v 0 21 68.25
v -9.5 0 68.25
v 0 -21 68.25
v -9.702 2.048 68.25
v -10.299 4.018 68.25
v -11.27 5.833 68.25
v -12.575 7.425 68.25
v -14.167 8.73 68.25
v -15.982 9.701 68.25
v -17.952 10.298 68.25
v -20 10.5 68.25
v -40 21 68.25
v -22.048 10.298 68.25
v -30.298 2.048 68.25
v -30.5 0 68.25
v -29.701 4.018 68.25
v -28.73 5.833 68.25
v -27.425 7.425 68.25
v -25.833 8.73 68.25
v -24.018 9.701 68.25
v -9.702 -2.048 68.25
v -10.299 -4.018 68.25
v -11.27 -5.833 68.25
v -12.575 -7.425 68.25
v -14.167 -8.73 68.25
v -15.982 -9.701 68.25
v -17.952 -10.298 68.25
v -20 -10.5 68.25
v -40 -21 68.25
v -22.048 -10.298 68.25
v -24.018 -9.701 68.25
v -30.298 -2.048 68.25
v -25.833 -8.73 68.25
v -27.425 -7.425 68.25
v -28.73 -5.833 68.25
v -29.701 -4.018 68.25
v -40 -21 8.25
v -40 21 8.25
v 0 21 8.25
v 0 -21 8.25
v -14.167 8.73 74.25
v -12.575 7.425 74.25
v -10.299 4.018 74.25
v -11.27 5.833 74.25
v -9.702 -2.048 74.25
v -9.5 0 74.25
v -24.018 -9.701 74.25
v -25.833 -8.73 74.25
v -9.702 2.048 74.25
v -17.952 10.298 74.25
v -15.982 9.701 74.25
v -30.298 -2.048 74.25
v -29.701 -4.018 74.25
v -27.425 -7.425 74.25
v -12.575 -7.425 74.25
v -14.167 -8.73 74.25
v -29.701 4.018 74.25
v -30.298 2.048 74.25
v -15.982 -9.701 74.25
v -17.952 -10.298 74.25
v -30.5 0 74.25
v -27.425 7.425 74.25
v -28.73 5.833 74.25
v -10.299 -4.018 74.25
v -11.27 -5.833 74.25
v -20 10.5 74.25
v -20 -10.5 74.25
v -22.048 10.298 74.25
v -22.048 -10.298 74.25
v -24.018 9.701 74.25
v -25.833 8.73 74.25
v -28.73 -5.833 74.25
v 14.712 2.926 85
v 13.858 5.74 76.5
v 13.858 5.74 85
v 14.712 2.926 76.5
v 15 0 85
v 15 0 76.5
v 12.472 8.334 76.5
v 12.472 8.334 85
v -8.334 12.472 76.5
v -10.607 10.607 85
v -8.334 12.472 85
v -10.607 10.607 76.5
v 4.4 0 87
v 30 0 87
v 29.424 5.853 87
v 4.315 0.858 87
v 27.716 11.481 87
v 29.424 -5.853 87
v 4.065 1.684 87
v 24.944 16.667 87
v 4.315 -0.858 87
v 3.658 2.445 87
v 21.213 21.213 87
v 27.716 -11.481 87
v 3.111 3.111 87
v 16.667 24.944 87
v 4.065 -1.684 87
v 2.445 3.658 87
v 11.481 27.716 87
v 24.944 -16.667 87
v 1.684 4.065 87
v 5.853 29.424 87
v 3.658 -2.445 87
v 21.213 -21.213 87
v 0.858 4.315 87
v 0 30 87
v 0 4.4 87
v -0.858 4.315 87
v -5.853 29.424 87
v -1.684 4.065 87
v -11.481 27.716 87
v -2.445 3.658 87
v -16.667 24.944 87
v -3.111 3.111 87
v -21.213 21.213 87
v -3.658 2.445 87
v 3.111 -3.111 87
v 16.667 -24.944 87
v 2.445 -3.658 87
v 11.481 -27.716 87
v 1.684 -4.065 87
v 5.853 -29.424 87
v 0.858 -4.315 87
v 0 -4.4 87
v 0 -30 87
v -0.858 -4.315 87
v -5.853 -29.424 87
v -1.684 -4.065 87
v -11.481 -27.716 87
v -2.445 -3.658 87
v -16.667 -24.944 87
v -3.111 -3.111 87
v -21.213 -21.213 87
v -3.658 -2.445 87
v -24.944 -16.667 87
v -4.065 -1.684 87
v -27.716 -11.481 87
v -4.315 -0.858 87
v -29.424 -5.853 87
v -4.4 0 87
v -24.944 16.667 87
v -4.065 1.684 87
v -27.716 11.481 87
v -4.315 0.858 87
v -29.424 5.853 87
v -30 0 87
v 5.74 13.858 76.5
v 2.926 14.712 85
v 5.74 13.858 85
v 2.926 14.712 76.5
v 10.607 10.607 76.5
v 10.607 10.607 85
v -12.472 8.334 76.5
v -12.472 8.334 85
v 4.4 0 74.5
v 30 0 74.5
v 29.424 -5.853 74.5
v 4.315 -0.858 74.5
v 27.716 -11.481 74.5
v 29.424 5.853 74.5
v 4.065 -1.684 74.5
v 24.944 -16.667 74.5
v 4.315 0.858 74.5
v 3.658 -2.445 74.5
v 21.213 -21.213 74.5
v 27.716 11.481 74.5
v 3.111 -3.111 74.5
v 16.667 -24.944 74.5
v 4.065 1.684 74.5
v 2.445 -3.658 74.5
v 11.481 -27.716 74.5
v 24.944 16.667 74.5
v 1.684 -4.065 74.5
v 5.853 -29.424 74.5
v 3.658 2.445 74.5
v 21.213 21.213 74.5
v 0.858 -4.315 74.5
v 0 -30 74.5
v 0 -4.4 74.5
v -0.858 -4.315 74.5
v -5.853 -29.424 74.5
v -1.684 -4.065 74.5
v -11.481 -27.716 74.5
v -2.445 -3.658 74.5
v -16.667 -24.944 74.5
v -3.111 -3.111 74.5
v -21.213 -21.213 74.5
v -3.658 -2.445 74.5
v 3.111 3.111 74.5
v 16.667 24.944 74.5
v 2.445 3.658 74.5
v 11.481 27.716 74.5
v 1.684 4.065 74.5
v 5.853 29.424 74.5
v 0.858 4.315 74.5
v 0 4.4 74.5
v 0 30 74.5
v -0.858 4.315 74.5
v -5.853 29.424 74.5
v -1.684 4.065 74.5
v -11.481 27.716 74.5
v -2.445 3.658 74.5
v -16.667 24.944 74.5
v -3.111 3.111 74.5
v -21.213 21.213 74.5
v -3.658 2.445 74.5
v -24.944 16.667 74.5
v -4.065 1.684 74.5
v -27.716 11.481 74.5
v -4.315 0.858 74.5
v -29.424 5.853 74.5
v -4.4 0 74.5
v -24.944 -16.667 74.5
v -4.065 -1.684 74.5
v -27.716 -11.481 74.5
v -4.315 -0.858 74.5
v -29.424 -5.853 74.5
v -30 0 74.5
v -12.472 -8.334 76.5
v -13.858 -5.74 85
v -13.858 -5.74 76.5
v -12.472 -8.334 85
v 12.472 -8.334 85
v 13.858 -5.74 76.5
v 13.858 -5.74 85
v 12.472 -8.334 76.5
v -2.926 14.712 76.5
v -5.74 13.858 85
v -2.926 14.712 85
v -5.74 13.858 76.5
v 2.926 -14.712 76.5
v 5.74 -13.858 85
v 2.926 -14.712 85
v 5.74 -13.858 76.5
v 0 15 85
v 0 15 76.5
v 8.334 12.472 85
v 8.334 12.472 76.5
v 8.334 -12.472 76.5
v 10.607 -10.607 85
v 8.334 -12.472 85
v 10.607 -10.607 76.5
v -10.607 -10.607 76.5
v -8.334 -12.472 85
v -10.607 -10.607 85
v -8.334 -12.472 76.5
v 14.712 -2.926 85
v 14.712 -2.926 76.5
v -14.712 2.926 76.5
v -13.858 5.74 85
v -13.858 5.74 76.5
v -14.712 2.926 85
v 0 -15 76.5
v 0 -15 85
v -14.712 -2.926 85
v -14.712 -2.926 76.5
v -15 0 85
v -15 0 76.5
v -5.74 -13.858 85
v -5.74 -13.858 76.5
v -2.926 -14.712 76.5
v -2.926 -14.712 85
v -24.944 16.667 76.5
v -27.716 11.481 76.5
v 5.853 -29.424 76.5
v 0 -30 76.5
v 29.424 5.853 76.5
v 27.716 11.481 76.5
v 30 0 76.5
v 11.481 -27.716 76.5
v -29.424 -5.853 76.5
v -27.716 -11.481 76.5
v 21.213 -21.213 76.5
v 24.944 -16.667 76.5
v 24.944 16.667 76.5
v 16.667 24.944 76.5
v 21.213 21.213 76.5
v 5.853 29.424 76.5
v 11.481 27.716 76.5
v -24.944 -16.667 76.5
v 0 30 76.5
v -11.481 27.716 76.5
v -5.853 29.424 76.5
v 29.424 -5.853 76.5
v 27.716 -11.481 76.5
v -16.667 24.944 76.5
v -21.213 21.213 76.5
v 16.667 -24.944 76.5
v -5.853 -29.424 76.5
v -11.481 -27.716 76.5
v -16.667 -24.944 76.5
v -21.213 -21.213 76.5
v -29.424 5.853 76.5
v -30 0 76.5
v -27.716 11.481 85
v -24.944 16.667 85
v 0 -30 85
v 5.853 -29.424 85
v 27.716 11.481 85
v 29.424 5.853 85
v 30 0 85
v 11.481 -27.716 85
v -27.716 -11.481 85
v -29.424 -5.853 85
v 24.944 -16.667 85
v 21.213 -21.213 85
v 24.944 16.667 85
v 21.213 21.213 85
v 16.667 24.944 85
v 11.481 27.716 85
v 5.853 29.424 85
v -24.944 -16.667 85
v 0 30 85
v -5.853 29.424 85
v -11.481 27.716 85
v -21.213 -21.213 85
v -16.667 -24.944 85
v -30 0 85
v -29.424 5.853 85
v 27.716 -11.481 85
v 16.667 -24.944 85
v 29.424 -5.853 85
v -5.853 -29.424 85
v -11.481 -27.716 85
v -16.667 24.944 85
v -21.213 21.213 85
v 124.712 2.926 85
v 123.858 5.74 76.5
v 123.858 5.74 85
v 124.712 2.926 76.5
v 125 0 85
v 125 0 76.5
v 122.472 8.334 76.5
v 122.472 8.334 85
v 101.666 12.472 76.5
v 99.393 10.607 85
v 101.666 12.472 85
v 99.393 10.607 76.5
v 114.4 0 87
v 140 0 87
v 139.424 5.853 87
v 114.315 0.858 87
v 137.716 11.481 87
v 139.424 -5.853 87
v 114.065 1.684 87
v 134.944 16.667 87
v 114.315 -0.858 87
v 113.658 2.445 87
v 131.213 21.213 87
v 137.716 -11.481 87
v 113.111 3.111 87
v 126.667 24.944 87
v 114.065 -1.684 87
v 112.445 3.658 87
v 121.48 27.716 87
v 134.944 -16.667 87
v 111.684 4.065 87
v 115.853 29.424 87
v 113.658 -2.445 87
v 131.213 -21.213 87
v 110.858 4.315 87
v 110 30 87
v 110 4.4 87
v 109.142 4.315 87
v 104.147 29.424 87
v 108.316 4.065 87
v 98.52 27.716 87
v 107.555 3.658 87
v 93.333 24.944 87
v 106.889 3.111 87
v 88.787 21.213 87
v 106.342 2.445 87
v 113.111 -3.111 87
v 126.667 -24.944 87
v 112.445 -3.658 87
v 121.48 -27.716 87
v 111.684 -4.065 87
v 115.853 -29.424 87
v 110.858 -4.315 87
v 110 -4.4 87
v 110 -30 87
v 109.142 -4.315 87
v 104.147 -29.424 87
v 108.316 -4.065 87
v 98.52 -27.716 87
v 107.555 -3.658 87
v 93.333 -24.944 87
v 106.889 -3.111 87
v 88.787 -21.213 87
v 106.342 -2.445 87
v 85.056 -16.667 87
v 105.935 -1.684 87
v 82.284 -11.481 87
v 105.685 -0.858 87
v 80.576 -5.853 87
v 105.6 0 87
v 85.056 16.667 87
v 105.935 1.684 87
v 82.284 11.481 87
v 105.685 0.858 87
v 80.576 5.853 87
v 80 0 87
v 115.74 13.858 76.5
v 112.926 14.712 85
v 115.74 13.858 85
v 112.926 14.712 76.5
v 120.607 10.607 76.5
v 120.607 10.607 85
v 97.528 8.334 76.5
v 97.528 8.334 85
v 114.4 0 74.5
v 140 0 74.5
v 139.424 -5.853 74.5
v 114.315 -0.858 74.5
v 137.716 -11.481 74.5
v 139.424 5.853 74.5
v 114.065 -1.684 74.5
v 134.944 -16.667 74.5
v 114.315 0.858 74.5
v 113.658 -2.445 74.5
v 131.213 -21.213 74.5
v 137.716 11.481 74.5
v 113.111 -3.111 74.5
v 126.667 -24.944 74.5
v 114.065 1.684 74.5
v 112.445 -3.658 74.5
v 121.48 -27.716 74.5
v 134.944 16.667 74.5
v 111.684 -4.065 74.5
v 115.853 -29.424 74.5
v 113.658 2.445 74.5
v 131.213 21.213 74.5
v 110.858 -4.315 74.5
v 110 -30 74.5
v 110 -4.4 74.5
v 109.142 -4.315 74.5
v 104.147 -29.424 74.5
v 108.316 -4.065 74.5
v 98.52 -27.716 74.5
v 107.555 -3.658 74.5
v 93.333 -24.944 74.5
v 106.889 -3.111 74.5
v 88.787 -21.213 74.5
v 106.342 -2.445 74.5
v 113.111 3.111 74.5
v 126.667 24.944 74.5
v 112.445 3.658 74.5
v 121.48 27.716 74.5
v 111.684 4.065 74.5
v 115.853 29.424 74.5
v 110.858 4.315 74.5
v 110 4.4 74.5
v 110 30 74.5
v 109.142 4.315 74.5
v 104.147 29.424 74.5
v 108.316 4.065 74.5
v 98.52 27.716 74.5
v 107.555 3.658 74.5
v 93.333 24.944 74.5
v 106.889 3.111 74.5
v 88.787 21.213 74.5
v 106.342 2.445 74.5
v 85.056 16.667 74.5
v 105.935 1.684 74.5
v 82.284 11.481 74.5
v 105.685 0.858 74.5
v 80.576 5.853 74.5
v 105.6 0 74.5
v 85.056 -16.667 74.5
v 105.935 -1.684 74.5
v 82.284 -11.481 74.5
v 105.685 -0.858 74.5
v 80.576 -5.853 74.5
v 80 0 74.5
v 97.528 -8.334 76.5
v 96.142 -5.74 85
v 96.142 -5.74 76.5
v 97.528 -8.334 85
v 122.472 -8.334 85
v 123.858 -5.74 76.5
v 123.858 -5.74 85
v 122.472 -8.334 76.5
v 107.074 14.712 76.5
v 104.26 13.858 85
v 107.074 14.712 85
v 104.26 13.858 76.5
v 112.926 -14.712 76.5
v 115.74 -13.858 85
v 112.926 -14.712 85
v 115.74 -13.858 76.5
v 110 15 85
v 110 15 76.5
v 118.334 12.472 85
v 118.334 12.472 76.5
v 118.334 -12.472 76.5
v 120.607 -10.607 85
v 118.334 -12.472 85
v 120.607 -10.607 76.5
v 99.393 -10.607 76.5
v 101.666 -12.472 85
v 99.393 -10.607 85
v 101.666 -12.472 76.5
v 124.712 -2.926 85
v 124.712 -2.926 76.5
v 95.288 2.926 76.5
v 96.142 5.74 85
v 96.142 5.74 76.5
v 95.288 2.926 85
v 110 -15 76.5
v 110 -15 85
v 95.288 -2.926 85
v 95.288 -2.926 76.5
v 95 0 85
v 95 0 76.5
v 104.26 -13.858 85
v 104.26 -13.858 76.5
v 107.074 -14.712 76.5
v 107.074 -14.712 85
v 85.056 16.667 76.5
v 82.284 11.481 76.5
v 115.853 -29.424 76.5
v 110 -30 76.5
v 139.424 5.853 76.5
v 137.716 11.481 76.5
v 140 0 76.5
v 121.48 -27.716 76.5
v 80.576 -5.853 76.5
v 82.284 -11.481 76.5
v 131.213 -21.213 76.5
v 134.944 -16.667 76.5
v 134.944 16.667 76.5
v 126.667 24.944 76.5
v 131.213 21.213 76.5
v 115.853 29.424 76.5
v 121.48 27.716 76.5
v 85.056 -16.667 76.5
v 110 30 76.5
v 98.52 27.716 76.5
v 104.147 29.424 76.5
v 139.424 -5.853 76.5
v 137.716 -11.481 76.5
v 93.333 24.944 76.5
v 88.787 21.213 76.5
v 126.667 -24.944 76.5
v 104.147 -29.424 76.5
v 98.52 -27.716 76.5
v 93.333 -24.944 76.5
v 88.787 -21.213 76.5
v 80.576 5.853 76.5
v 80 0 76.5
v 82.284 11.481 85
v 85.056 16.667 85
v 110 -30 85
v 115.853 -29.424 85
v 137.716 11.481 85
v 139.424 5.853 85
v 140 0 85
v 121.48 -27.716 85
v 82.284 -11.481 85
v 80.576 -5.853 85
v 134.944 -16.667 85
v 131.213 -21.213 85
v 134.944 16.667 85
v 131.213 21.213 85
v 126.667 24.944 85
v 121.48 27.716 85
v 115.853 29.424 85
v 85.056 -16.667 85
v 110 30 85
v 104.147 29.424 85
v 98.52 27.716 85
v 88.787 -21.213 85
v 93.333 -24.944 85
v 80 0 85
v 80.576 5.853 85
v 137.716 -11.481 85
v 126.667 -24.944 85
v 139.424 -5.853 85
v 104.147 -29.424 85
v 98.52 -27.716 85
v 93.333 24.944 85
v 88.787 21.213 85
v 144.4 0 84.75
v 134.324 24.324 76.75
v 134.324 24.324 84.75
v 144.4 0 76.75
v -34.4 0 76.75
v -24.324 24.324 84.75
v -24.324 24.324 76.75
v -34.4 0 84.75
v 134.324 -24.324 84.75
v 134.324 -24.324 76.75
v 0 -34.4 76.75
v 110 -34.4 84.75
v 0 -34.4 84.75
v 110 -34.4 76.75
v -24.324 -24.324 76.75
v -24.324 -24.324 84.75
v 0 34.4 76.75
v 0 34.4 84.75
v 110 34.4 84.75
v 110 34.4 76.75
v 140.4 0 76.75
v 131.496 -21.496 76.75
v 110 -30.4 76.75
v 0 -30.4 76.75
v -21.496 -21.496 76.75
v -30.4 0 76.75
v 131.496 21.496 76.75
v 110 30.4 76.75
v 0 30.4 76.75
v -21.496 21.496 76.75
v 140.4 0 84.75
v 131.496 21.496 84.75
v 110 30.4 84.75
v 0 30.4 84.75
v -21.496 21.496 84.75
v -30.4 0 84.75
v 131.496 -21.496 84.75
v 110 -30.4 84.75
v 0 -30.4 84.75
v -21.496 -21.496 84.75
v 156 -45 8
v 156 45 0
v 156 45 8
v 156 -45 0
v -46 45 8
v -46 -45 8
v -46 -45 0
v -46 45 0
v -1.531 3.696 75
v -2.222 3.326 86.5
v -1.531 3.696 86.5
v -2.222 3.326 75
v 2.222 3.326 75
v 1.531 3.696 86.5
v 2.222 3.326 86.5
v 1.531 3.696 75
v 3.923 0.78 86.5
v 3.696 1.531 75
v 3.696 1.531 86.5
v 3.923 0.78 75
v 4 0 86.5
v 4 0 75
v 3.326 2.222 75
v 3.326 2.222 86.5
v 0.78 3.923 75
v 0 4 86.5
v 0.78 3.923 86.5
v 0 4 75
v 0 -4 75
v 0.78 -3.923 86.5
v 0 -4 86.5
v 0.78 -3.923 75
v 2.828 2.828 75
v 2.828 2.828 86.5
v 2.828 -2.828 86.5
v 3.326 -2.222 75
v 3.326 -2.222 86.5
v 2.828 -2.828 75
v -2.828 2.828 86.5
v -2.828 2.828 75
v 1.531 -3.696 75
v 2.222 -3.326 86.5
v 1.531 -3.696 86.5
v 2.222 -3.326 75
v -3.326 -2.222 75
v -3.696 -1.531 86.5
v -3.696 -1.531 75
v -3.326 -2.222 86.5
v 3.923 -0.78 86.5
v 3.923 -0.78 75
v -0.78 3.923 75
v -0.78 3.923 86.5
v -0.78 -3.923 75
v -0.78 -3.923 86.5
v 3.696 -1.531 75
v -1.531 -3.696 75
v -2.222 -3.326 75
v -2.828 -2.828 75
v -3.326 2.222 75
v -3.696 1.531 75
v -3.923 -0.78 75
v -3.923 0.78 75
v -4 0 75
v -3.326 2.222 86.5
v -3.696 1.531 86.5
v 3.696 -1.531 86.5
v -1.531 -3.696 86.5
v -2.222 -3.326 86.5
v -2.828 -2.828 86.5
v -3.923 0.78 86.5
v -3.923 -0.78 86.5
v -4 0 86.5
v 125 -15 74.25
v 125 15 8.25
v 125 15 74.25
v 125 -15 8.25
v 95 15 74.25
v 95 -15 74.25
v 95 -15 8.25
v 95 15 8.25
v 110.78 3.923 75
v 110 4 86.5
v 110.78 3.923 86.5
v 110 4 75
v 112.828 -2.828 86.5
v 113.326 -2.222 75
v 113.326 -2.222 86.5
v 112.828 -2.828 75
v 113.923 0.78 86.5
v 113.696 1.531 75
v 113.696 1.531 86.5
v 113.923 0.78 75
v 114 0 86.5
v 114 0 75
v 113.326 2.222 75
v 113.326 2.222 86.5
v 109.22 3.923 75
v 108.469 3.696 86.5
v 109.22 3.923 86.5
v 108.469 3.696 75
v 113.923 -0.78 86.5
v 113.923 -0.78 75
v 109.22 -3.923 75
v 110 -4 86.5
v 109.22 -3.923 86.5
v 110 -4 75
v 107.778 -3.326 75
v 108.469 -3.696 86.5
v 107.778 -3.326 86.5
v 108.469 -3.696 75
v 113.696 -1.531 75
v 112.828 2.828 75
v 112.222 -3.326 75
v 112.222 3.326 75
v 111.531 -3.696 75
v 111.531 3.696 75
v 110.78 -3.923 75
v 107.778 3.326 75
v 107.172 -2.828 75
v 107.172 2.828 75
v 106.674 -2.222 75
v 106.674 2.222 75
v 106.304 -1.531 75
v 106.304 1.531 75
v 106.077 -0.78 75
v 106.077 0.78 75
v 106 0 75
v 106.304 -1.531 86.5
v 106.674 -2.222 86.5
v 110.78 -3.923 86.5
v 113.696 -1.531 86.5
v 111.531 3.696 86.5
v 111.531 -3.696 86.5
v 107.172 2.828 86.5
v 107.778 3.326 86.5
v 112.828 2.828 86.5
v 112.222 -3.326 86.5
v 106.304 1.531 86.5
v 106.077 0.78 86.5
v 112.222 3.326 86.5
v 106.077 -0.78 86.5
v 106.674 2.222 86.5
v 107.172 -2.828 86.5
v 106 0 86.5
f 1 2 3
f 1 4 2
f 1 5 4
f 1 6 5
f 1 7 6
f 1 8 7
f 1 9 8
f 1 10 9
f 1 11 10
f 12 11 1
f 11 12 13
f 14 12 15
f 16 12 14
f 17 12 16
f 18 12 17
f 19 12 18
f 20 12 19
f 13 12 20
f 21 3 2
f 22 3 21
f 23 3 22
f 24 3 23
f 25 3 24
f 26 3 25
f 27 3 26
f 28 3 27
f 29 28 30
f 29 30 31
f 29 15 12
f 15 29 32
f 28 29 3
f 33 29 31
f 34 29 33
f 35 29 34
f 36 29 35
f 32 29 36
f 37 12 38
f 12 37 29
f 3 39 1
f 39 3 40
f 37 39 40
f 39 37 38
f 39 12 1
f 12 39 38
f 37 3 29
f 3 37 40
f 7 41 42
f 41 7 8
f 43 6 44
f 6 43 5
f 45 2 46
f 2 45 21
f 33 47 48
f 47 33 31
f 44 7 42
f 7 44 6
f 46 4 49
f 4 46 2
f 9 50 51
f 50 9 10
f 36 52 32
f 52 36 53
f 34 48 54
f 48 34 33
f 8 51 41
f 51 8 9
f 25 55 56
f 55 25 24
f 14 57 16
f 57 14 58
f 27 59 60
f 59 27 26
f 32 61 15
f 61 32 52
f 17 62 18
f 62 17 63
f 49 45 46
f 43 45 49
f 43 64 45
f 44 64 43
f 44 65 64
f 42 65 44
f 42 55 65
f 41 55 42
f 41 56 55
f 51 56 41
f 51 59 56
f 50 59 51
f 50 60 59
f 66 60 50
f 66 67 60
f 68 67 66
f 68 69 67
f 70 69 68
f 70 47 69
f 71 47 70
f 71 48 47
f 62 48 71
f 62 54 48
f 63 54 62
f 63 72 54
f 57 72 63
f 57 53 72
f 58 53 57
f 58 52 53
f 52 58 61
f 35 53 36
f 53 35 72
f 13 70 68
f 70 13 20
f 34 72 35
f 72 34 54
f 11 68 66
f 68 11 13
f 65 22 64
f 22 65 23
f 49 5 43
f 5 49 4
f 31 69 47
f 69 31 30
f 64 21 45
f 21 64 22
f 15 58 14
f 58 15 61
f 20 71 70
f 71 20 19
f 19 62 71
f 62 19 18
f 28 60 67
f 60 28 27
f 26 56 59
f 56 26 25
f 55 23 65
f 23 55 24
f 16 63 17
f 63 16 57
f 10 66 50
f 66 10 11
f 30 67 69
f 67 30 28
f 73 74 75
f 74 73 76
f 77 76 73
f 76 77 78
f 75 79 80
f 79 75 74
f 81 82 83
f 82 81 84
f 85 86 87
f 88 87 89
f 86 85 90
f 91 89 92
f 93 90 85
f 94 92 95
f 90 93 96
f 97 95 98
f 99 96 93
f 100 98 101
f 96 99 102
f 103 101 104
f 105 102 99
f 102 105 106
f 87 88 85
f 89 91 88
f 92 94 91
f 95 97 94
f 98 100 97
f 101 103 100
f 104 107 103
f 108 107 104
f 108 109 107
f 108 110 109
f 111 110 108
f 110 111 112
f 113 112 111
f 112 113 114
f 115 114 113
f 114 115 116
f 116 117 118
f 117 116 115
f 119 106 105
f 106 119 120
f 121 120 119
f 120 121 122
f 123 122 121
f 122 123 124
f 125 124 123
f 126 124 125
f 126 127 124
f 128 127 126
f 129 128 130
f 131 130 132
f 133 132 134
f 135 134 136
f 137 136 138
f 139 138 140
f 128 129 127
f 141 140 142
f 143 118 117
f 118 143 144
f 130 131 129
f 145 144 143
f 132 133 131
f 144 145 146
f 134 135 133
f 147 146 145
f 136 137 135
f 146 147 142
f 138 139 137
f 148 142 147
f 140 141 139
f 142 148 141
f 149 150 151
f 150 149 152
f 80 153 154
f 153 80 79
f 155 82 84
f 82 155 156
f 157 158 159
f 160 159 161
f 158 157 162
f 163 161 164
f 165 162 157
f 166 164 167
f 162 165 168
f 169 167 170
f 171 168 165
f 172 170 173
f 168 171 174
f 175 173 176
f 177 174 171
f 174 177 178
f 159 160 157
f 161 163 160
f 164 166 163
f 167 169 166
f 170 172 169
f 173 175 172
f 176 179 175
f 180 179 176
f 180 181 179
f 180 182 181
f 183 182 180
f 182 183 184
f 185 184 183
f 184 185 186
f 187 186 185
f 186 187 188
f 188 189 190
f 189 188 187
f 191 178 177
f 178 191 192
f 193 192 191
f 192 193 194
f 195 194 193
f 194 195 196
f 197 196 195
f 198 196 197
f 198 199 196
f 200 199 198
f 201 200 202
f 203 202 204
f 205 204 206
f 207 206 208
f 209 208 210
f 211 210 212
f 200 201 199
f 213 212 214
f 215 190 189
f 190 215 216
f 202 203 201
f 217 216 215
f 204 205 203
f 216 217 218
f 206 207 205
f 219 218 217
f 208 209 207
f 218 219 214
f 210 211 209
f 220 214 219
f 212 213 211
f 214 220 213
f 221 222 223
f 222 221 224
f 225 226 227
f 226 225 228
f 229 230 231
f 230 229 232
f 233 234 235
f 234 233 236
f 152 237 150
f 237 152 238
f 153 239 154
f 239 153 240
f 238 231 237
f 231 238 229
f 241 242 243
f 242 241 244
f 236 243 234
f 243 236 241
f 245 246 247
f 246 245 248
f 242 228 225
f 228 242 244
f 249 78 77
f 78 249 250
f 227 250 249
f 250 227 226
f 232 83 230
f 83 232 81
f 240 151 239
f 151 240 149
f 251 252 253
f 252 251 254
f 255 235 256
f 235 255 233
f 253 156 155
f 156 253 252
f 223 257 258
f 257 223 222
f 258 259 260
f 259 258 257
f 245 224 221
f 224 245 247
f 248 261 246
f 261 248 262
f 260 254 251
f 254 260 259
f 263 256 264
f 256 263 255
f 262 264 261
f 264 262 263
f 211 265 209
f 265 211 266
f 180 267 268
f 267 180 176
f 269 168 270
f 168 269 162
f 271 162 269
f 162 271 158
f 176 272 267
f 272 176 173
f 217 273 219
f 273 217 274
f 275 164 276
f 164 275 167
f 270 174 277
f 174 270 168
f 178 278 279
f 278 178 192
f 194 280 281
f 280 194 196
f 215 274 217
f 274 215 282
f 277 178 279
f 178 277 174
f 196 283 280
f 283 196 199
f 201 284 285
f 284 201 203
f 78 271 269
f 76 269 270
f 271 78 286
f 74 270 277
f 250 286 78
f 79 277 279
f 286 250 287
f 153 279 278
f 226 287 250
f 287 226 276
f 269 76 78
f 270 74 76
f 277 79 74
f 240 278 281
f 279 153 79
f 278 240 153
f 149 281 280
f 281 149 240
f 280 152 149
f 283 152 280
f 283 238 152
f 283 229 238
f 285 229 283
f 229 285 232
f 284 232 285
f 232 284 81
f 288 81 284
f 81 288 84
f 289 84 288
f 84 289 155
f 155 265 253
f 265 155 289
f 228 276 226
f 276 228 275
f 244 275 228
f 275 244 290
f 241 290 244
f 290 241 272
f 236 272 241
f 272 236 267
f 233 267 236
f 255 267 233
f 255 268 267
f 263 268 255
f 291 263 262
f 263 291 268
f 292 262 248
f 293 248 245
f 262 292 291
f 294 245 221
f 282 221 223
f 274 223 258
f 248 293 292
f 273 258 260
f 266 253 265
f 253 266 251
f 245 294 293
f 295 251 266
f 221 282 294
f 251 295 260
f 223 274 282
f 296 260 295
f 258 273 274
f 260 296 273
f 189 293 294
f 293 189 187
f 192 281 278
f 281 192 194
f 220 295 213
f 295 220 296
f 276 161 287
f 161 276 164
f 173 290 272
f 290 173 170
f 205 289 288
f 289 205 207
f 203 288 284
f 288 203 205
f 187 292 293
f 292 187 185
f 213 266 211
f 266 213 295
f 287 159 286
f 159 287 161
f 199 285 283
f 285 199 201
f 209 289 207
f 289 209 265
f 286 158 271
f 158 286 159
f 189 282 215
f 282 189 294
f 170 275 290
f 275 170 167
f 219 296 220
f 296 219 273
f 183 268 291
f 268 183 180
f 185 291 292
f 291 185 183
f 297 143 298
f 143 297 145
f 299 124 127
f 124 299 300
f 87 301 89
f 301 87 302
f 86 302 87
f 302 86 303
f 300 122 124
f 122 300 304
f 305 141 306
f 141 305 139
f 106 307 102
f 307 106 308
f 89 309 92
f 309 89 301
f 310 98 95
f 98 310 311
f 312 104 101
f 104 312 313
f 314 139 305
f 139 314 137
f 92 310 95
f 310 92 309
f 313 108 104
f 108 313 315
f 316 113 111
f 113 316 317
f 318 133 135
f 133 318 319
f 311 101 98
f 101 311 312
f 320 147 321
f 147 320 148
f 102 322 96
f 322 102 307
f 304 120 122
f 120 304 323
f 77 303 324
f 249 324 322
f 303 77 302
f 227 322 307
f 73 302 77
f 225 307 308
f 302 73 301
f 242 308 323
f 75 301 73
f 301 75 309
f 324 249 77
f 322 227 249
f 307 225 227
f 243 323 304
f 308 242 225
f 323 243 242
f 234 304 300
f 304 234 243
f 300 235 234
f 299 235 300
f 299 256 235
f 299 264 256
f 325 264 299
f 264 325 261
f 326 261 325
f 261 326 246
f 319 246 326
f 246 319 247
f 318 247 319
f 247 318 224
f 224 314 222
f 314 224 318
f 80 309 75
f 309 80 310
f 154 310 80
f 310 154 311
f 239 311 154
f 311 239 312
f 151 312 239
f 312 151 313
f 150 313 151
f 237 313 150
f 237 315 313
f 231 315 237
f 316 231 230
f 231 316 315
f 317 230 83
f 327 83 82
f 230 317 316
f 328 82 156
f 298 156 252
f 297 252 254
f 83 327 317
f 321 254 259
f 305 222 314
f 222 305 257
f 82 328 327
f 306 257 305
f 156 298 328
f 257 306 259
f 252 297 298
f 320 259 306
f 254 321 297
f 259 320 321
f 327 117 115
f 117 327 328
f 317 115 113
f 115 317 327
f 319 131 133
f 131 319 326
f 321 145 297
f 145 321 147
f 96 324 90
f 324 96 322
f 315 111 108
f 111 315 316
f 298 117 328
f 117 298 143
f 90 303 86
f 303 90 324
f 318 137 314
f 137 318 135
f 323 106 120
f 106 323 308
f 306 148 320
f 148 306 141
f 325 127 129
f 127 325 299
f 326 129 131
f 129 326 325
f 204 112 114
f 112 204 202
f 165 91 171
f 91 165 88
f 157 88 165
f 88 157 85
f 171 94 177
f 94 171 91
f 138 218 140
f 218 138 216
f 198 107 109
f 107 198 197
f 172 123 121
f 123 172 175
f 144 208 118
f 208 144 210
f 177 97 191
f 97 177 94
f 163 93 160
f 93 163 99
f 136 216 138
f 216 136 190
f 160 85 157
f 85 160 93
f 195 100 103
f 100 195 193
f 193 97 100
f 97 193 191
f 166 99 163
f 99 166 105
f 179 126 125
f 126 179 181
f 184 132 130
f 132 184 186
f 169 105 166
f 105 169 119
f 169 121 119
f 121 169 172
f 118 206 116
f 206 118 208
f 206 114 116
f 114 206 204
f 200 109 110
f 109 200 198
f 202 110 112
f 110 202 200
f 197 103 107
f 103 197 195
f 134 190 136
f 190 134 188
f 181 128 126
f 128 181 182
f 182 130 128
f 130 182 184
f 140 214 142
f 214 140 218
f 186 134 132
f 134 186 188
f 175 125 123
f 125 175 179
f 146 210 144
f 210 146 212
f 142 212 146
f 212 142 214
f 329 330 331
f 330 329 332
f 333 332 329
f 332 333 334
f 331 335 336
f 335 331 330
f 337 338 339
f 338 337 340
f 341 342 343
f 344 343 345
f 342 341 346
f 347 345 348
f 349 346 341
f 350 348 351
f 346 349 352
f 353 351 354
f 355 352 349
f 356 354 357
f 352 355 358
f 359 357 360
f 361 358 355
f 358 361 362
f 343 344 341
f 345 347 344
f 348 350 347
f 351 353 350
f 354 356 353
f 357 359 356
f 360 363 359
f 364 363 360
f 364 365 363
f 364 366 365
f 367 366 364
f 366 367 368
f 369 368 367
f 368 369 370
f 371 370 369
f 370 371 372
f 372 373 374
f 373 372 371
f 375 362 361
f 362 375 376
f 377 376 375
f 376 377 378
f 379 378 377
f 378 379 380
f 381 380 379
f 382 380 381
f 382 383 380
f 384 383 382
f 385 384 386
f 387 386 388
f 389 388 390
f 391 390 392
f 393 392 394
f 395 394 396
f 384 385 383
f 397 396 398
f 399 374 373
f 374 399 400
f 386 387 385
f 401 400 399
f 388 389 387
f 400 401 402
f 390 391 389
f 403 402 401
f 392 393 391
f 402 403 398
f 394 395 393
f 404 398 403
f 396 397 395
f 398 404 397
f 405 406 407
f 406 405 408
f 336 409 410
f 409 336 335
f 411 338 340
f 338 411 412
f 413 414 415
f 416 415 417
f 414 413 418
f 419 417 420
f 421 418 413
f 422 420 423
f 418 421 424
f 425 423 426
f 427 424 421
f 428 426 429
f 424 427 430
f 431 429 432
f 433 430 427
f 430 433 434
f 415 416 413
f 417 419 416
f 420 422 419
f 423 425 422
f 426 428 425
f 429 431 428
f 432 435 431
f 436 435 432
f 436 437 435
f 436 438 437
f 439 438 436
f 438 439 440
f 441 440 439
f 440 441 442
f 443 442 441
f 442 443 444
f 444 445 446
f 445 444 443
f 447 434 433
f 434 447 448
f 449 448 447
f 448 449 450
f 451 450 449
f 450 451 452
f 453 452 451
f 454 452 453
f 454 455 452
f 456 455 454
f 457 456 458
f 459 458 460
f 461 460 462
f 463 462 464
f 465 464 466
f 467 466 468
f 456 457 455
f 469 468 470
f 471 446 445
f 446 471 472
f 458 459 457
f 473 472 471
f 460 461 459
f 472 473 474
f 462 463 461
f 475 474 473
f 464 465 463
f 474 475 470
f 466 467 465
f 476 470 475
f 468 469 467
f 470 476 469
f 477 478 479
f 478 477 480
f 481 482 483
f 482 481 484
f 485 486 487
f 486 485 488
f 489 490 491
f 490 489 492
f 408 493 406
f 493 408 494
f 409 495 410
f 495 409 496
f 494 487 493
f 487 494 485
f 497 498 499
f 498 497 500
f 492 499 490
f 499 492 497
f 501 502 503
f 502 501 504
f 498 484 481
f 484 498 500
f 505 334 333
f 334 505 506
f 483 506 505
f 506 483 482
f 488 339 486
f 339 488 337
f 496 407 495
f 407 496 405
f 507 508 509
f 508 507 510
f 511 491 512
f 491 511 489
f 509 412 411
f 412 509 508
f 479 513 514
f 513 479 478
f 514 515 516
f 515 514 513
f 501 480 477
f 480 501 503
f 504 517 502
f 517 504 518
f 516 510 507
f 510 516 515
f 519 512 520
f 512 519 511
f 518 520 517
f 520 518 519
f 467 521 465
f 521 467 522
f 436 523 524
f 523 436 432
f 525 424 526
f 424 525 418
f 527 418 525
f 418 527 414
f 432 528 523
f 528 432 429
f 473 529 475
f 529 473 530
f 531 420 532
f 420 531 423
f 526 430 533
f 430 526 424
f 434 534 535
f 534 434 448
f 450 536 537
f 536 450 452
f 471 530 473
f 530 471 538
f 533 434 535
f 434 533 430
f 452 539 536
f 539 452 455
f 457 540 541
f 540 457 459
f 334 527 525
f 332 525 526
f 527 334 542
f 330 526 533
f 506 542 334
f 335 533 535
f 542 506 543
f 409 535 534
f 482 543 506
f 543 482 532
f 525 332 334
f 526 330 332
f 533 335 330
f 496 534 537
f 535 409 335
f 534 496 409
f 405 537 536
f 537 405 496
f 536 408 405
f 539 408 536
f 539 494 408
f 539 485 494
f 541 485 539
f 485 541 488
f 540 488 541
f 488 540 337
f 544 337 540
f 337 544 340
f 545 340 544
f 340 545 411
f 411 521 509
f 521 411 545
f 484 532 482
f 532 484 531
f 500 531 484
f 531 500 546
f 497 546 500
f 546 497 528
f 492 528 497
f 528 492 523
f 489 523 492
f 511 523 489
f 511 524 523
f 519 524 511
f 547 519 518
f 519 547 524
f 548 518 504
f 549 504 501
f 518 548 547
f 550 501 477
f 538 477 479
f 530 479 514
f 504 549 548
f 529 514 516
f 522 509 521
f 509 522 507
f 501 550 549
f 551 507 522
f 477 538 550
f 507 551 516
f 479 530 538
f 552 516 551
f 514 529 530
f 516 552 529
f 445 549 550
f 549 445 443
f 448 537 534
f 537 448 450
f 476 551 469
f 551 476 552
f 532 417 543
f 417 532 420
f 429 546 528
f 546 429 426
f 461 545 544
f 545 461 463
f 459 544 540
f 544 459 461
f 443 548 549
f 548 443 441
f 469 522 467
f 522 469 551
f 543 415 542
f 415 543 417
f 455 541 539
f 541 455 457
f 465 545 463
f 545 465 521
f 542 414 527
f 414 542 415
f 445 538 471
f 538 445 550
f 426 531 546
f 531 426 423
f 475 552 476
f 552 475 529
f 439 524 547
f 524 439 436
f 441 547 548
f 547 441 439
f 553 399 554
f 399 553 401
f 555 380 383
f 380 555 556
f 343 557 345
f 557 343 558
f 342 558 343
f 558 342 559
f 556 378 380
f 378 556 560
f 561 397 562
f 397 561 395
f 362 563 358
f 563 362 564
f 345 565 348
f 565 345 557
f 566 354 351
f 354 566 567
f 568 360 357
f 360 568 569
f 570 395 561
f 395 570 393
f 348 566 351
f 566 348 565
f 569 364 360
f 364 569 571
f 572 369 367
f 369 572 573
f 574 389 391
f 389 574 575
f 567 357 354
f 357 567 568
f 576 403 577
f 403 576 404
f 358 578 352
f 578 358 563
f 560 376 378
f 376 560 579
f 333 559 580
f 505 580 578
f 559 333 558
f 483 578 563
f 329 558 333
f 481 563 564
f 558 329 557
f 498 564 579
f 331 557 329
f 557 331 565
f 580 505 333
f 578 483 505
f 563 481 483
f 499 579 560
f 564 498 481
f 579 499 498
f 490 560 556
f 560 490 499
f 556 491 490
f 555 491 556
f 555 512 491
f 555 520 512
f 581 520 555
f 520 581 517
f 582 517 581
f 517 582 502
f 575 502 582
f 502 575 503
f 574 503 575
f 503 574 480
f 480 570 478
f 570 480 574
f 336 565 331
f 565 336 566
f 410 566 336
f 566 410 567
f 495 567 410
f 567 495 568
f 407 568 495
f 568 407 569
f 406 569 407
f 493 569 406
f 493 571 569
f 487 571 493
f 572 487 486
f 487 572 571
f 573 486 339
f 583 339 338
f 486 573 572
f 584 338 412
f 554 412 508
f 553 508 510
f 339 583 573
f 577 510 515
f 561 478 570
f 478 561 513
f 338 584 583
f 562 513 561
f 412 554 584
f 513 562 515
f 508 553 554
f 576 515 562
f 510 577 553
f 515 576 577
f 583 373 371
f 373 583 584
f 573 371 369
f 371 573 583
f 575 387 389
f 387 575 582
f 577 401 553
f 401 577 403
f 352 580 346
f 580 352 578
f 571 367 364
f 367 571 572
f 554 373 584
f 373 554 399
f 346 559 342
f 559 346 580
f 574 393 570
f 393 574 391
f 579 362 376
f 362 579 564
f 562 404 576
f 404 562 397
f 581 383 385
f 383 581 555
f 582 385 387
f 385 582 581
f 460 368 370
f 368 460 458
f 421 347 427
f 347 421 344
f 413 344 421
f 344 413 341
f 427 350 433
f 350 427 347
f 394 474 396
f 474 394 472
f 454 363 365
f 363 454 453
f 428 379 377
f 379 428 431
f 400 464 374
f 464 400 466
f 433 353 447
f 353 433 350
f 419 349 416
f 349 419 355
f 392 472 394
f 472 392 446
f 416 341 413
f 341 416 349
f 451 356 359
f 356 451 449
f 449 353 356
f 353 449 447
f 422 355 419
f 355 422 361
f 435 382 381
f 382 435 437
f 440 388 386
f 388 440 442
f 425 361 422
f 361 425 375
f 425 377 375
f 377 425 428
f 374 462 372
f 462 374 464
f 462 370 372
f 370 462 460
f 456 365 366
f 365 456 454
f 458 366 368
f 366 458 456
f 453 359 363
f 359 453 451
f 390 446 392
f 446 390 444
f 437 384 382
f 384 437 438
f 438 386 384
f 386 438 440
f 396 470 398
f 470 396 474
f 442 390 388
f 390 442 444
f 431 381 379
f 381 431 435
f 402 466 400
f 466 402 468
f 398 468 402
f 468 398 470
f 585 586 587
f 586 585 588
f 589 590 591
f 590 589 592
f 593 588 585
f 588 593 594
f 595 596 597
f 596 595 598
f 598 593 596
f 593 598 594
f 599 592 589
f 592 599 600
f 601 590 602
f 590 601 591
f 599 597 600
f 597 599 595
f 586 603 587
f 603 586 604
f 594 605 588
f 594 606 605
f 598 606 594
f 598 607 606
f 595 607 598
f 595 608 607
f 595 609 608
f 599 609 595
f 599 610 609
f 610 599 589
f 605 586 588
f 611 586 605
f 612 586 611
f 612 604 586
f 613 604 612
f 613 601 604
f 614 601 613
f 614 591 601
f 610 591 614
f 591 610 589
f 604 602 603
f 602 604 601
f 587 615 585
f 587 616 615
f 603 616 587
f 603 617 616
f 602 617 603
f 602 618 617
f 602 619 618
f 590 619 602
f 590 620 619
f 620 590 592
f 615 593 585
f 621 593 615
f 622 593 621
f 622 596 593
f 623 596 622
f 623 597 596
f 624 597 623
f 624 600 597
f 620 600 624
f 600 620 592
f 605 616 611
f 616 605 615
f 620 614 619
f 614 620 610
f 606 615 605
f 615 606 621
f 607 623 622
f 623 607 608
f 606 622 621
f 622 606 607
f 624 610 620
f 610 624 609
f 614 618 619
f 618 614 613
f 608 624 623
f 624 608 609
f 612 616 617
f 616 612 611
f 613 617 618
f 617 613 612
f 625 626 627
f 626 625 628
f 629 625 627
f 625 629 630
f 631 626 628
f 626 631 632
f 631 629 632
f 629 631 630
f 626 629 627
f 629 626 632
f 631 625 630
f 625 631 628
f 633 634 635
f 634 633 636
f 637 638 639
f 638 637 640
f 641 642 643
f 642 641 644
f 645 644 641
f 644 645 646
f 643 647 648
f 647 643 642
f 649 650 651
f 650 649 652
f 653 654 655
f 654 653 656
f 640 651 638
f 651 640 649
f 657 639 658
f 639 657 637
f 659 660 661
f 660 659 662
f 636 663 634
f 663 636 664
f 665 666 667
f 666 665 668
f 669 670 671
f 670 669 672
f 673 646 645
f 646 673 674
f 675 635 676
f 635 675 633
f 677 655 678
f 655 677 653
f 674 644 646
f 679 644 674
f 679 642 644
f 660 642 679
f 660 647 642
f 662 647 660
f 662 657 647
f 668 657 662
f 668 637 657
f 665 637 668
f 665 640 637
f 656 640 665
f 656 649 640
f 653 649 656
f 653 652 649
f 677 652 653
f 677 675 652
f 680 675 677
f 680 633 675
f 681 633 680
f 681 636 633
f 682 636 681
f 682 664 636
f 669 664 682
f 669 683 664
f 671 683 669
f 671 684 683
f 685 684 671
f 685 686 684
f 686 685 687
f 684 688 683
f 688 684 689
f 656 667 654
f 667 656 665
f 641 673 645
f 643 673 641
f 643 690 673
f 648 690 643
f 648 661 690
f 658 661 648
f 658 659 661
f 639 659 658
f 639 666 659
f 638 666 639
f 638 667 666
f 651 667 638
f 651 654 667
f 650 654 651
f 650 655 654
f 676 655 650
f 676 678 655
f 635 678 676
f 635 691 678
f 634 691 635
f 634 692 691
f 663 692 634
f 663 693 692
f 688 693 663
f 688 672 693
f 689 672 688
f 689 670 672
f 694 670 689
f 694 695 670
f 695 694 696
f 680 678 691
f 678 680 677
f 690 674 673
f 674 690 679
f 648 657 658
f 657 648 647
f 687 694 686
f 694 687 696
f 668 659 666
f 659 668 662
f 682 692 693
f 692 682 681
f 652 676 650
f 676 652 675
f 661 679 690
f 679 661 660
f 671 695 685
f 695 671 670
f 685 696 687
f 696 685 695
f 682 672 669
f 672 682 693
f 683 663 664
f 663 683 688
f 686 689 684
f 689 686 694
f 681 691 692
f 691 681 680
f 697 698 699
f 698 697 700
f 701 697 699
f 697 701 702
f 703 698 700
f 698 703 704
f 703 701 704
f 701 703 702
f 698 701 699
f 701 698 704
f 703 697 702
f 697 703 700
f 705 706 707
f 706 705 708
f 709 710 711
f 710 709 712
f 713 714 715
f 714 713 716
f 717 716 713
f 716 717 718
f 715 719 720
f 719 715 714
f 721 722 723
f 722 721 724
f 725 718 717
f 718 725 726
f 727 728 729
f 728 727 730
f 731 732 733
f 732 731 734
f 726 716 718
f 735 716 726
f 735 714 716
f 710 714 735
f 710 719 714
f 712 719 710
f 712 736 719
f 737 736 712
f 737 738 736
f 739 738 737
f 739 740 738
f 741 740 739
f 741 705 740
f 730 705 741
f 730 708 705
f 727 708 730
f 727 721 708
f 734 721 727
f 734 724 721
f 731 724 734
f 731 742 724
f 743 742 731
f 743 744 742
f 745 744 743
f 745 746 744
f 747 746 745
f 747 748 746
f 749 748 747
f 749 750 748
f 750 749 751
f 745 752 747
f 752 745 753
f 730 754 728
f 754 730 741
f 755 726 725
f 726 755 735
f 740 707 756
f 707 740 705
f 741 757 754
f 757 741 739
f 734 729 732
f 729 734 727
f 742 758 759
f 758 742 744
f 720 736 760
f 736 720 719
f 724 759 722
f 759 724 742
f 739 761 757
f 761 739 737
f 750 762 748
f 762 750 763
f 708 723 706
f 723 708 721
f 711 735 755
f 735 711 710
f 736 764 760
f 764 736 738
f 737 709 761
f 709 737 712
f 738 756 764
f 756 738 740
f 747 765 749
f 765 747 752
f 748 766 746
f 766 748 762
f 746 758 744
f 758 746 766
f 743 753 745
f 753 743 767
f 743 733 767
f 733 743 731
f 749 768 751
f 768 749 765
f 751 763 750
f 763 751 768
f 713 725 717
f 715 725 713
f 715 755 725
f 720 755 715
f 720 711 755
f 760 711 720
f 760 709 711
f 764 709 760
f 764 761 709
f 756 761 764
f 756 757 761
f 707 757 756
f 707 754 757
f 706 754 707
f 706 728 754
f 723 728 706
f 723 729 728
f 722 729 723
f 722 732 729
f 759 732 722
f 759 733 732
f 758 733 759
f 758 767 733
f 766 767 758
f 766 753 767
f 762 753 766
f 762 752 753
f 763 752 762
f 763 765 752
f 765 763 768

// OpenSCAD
$fn = 32;

// ------------------------------------------------------------------------
// Motor belt drive: span 110 mm, pulleys d60, belt 8 mm wide
// Every part is its own module, assembly() places every instance.
// ------------------------------------------------------------------------

// --- part 1 ---
module base_plate() {
  difference() {
    translate([-101, -45, 0]) cube([202, 90, 8]);
  }
}

// --- part 2 ---
module motor() {
  union() {
    translate([-30, -21, 0]) cube([60, 42, 40]);
    translate([33, 0, 20]) rotate([0, 90, 0]) cylinder(h = 6, d = 21, center = true);
  }
}

// --- part 3 ---
module drive_shaft() {
  translate([0, 0, -5.75]) cylinder(h = 11.5, d = 8);
}

// --- part 4 ---
module pulley_drive() {
  difference() {
    union() {
      cylinder(h = 12.5, d = 30);
      cylinder(h = 2, d = 60);
      translate([0, 0, 10.5]) cylinder(h = 2, d = 60);
    }
    translate([0, 0, -1]) cylinder(h = 14.5, d = 8.8);
  }
}

// --- part 5 ---
module idler_post() {
  translate([-15, -15, 0]) cube([30, 30, 66]);
}

// --- part 6 ---
module driven_shaft() {
  translate([0, 0, -5.75]) cylinder(h = 11.5, d = 8);
}

// --- part 7 ---
module pulley_driven() {
  difference() {
    union() {
      cylinder(h = 12.5, d = 30);
      cylinder(h = 2, d = 60);
      translate([0, 0, 10.5]) cylinder(h = 2, d = 60);
    }
    translate([0, 0, -1]) cylinder(h = 14.5, d = 8.8);
  }
}

// --- part 8 ---
module drive_belt() {
  difference() {
    linear_extrude(height = 8) polygon(points = concat([for (a = [90 : 45 : 270]) [34.4 * cos(a), 34.4 * sin(a)]], [for (a = [270 : 45 : 450]) [110 + 34.4 * cos(a), 34.4 * sin(a)]]));
    translate([0, 0, -1]) linear_extrude(height = 10) polygon(points = concat([for (a = [90 : 45 : 270]) [30.4 * cos(a), 30.4 * sin(a)]], [for (a = [270 : 45 : 450]) [110 + 30.4 * cos(a), 30.4 * sin(a)]]));
  }
}

// --- assembly ---
module assembly() {
  color([0.80, 0.24, 0.20]) translate([55, 0, 0]) rotate([0, 0, 0]) base_plate();
  color([0.20, 0.45, 0.75]) translate([0, 0, 38.25]) rotate([0, 270, 0]) motor();
  color([0.25, 0.62, 0.32]) translate([0, 0, 80.75]) rotate([0, 0, 0]) drive_shaft();
  color([0.92, 0.70, 0.18]) translate([0, 0, 74.5]) rotate([0, 0, 0]) pulley_drive();
  color([0.58, 0.35, 0.70]) translate([110, 0, 8.25]) rotate([0, 0, 0]) idler_post();
  color([0.16, 0.66, 0.66]) translate([110, 0, 80.75]) rotate([0, 0, 0]) driven_shaft();
  color([0.85, 0.48, 0.18]) translate([110, 0, 74.5]) rotate([0, 0, 0]) pulley_driven();
  color([0.55, 0.60, 0.65]) translate([0, 0, 76.75]) rotate([0, 0, 0]) drive_belt();
}

assembly();
